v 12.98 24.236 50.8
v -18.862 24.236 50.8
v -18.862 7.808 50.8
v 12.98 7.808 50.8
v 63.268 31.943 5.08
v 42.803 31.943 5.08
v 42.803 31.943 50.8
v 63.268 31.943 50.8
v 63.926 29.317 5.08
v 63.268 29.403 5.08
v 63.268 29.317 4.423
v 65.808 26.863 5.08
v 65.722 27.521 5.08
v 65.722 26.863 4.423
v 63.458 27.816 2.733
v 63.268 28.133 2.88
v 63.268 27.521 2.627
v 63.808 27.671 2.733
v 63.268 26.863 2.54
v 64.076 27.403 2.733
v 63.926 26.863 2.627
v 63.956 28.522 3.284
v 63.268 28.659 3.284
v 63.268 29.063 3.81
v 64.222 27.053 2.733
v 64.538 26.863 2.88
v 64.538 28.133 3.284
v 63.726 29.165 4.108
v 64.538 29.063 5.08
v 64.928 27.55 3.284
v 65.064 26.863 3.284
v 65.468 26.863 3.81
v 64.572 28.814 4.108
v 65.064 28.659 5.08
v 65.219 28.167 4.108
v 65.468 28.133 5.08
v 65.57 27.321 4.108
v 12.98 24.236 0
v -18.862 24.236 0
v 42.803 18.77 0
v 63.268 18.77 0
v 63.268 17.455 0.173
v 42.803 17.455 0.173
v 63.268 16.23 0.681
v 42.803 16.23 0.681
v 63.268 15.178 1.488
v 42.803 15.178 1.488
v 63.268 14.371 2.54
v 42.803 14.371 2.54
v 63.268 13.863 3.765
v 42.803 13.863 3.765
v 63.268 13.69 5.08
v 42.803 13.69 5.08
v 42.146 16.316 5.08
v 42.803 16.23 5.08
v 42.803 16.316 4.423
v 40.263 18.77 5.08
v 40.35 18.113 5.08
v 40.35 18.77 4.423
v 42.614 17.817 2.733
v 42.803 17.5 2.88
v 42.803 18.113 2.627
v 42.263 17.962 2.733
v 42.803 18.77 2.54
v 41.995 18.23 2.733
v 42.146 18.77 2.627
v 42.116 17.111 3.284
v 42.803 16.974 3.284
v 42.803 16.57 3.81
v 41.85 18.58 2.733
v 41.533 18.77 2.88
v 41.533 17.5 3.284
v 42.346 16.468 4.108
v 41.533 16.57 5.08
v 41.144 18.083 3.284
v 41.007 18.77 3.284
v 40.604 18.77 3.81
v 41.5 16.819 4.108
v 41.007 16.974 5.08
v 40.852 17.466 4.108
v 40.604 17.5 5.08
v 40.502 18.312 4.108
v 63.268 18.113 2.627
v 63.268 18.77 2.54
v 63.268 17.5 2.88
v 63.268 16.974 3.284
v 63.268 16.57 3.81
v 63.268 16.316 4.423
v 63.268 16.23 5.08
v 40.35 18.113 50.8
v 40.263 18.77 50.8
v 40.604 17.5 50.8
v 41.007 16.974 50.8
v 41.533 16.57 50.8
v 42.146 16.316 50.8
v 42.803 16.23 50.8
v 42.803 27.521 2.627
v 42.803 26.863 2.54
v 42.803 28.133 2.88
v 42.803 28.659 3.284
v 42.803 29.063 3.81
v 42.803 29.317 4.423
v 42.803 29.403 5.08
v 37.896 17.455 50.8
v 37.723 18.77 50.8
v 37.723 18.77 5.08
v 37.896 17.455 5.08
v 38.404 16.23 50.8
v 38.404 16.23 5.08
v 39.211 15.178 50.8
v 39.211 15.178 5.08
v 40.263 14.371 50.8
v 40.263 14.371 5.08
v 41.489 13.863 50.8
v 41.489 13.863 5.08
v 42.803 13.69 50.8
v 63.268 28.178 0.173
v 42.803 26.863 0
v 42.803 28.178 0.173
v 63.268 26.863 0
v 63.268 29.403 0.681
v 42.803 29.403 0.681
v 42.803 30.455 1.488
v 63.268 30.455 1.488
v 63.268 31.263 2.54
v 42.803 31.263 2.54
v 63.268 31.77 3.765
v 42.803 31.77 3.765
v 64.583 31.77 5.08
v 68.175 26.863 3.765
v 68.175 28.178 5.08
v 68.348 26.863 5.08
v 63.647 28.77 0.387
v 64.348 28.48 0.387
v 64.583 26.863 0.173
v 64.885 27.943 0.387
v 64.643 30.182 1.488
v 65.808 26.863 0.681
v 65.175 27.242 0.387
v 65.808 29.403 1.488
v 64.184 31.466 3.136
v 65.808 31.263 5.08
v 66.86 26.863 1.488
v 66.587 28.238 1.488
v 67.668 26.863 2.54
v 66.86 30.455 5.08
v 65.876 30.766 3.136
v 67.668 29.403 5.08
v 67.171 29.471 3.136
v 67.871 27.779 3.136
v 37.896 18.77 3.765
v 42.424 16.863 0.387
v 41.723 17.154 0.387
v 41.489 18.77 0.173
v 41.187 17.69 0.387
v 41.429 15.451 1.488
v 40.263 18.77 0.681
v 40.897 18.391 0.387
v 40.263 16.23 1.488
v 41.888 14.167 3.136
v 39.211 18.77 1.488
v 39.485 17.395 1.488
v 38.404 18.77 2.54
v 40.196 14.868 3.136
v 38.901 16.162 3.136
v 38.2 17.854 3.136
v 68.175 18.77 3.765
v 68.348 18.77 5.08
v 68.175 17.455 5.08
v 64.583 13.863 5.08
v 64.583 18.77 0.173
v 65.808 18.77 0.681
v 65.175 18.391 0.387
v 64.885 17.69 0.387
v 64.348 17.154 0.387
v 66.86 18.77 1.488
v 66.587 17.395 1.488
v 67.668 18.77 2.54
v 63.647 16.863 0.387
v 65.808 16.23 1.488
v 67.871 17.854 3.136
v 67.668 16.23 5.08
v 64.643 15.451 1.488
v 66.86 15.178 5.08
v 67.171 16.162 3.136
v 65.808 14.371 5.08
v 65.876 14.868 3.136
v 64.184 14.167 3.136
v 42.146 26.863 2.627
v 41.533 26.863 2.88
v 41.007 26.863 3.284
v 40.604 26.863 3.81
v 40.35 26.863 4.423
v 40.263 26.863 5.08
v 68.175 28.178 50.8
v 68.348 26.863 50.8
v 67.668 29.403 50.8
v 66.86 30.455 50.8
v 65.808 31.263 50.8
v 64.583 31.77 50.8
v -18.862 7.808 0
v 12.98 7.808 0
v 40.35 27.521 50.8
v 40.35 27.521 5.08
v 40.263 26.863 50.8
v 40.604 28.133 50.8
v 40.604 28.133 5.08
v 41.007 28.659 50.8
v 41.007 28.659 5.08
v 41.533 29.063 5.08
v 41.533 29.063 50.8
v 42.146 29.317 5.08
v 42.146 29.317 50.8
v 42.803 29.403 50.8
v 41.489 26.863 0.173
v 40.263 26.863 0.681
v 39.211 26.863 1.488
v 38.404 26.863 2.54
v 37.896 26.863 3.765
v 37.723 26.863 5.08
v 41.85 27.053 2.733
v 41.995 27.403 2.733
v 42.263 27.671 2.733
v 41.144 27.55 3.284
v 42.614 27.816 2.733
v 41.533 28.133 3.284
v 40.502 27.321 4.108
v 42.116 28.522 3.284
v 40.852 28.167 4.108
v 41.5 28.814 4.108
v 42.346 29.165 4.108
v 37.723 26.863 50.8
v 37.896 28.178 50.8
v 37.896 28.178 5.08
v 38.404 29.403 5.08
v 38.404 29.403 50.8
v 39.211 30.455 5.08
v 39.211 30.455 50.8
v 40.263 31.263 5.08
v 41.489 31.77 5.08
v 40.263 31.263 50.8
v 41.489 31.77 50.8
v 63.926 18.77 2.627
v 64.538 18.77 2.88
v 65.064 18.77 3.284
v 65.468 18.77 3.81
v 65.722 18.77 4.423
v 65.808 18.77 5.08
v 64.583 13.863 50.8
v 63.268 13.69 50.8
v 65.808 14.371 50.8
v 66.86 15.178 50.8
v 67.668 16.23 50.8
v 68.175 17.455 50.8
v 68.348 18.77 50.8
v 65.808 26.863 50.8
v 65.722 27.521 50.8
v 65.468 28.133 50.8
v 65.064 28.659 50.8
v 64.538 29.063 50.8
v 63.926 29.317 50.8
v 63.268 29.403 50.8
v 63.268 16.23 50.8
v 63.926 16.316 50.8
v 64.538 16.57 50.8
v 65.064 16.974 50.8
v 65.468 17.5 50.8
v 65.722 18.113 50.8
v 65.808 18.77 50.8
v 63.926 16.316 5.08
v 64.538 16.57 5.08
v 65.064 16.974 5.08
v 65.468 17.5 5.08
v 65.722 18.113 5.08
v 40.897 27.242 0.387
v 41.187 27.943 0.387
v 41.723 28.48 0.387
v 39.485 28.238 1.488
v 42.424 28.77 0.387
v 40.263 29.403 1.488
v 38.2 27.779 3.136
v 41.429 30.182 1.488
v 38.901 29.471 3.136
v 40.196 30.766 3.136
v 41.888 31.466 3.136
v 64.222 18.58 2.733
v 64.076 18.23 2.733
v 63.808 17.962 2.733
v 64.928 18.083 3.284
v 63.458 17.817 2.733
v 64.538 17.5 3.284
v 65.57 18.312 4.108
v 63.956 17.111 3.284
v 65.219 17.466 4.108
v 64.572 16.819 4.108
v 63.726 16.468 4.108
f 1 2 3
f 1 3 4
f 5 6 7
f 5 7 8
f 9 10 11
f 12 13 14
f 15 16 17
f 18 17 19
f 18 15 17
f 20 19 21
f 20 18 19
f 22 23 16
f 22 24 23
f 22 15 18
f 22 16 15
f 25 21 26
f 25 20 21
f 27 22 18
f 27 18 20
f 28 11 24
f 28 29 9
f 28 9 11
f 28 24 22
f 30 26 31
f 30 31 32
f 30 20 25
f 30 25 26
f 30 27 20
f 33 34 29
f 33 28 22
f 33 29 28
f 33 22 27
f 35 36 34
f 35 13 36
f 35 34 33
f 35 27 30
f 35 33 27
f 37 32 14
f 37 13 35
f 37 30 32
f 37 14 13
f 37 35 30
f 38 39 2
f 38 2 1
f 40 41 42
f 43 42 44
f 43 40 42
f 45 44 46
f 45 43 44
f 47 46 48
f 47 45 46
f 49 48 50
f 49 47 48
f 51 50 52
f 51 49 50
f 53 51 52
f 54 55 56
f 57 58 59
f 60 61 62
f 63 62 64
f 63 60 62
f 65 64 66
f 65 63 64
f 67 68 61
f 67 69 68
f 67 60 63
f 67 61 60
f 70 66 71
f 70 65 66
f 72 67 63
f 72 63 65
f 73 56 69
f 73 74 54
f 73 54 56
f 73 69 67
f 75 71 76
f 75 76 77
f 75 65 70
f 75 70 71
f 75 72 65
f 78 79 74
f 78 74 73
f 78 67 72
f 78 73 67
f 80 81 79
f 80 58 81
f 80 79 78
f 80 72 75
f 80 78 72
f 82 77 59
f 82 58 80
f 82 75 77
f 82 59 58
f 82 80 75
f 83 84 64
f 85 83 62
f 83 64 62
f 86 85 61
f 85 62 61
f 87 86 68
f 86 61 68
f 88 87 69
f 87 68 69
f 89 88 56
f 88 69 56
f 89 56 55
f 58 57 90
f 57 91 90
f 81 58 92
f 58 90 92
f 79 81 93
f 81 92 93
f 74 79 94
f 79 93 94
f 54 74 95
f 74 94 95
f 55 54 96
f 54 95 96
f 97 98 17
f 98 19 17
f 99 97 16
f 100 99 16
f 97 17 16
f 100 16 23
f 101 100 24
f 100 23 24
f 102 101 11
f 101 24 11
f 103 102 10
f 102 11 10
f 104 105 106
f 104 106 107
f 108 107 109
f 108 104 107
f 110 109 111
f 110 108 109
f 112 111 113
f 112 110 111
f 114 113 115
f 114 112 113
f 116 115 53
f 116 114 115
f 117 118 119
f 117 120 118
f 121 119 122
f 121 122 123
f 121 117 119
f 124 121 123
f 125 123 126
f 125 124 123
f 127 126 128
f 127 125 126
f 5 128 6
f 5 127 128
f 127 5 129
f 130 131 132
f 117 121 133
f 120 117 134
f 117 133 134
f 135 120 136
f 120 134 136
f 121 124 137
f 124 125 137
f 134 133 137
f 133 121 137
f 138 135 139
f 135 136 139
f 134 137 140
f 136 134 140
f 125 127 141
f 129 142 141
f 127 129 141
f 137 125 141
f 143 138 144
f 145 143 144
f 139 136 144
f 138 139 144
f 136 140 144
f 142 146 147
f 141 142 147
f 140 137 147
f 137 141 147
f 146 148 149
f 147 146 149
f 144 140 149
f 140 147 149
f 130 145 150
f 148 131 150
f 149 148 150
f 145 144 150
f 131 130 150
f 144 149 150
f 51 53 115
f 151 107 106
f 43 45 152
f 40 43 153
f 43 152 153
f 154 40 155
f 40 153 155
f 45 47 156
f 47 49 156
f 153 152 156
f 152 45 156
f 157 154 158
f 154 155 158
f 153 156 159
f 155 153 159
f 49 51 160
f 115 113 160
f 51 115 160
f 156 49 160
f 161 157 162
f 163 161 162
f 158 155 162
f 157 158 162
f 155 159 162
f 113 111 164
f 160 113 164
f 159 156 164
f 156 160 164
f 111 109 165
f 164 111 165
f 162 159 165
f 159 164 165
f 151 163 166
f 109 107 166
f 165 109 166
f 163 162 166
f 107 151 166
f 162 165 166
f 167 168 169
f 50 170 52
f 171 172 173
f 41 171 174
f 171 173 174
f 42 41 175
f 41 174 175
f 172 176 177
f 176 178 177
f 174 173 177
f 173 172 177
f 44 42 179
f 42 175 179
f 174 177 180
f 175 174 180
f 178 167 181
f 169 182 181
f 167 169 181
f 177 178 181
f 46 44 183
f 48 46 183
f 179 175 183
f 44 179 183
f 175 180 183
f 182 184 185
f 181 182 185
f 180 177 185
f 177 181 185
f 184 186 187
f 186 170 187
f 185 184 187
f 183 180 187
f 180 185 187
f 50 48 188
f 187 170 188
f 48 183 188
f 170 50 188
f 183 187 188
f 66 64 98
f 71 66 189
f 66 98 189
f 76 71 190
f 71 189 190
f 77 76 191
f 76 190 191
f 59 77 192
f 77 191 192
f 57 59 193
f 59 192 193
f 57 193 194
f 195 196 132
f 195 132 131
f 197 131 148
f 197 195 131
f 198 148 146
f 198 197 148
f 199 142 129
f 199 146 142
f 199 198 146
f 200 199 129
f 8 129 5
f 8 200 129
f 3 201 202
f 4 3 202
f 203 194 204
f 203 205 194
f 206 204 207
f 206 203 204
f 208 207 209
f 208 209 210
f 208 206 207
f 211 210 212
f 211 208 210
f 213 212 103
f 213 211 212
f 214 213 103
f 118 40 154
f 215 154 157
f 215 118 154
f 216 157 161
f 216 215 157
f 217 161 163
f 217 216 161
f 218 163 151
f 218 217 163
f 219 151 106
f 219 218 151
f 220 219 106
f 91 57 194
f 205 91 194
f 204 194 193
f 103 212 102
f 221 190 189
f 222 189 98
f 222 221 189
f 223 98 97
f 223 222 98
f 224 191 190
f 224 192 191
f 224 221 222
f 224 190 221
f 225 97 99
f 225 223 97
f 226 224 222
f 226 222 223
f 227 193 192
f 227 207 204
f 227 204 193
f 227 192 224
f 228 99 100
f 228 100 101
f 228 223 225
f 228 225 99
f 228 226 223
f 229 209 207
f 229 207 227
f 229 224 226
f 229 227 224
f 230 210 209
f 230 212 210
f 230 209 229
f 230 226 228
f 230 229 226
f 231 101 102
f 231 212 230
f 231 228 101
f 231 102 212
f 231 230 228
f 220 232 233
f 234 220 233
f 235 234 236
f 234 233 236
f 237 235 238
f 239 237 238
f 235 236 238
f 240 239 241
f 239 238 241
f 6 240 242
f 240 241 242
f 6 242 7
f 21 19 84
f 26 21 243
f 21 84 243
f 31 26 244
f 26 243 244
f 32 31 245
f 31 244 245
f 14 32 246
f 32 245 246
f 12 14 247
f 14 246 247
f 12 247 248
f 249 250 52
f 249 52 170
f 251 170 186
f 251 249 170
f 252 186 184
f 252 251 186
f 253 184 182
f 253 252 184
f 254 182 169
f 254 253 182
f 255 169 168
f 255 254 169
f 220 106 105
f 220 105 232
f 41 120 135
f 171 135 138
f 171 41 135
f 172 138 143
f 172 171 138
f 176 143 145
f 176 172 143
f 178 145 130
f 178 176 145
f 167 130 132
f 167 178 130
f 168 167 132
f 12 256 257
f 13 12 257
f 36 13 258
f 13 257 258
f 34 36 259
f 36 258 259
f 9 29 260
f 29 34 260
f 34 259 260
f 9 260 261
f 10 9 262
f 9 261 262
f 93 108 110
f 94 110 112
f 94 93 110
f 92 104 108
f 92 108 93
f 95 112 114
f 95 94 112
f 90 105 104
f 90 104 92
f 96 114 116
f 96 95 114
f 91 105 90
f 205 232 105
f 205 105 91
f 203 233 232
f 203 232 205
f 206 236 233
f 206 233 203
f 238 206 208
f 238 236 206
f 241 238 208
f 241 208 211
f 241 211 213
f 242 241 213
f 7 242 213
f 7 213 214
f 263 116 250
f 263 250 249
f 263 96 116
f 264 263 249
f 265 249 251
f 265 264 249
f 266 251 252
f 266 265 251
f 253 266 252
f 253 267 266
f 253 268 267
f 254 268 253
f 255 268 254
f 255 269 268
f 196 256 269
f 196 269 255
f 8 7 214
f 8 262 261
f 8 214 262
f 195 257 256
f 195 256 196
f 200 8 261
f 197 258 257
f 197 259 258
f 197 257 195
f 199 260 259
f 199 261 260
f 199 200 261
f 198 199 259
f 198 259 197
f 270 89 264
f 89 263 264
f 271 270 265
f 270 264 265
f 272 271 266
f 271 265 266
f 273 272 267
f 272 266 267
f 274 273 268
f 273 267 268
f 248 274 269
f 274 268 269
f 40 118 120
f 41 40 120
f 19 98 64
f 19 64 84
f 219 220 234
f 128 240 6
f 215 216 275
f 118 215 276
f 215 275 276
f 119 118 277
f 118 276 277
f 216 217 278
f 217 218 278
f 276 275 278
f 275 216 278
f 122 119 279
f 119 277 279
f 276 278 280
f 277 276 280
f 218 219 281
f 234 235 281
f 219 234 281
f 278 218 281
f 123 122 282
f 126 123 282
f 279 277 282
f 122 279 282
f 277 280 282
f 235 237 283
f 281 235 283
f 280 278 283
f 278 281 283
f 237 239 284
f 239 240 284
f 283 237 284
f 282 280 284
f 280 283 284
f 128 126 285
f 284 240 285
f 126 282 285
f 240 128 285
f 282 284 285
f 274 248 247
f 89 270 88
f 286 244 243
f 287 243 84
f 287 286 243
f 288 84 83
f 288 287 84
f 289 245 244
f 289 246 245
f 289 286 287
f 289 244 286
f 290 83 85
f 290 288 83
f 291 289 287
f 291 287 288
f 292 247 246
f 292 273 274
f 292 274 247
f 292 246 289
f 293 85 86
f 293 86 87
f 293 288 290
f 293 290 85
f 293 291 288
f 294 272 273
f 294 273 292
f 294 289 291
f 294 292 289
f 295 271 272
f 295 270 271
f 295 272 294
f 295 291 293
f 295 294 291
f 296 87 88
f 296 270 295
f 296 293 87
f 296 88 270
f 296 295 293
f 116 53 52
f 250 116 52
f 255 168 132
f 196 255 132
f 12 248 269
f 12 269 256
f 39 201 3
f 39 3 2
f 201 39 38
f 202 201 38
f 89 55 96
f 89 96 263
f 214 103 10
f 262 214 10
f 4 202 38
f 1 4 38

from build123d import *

# Parameters (mm, degrees)
F0_W     = 31.8417474627
F0_H     = 16.427910421
F1_DEPTH = 50.8
F0_W_2   = 30.6248702109
F0_H_2   = 18.2532332838
F2_R     = 5.08
F3_R     = 5.08
F4_T     = -2.54


with BuildPart() as f1:
    # F0 (on Top) → F1 (new body)
    with BuildSketch(Plane.XY):
        with Locations((-2.9407981783, 16.0222824197)):
            Rectangle(F0_W, F0_H)
    extrude(amount=F1_DEPTH)


with BuildPart() as f1b:
    # F0 (on Top) → F1, piece 2 (new body)
    with BuildSketch(Plane.XY):
        with Locations((53.0357789248, 22.8165406734)):
            Rectangle(F0_W_2, F0_H_2)
    extrude(amount=F1_DEPTH)

    # F2
    f2_edges = [f1b.edges().sort_by_distance(p)[0] for p in [
        (68.348214, 13.689924, 25.4),
        (68.348214, 31.943157, 25.4),
        (37.723344, 13.689924, 25.4),
        (37.723344, 31.943157, 25.4),
    ]]
    fillet(f2_edges, radius=F2_R)

    # F3
    f3_edges = [f1b.edges().sort_by_distance(p)[0] for p in [
        (53.035779, 31.943157, 0),
    ]]
    fillet(f3_edges, radius=F3_R)

    # F4
    f4_openings = [f1b.faces().sort_by_distance(p)[0] for p in [
        (53.035779, 22.816541, 50.8),
    ]]
    offset(amount=F4_T, openings=f4_openings)


solid = Compound([f1.part, f1b.part])
